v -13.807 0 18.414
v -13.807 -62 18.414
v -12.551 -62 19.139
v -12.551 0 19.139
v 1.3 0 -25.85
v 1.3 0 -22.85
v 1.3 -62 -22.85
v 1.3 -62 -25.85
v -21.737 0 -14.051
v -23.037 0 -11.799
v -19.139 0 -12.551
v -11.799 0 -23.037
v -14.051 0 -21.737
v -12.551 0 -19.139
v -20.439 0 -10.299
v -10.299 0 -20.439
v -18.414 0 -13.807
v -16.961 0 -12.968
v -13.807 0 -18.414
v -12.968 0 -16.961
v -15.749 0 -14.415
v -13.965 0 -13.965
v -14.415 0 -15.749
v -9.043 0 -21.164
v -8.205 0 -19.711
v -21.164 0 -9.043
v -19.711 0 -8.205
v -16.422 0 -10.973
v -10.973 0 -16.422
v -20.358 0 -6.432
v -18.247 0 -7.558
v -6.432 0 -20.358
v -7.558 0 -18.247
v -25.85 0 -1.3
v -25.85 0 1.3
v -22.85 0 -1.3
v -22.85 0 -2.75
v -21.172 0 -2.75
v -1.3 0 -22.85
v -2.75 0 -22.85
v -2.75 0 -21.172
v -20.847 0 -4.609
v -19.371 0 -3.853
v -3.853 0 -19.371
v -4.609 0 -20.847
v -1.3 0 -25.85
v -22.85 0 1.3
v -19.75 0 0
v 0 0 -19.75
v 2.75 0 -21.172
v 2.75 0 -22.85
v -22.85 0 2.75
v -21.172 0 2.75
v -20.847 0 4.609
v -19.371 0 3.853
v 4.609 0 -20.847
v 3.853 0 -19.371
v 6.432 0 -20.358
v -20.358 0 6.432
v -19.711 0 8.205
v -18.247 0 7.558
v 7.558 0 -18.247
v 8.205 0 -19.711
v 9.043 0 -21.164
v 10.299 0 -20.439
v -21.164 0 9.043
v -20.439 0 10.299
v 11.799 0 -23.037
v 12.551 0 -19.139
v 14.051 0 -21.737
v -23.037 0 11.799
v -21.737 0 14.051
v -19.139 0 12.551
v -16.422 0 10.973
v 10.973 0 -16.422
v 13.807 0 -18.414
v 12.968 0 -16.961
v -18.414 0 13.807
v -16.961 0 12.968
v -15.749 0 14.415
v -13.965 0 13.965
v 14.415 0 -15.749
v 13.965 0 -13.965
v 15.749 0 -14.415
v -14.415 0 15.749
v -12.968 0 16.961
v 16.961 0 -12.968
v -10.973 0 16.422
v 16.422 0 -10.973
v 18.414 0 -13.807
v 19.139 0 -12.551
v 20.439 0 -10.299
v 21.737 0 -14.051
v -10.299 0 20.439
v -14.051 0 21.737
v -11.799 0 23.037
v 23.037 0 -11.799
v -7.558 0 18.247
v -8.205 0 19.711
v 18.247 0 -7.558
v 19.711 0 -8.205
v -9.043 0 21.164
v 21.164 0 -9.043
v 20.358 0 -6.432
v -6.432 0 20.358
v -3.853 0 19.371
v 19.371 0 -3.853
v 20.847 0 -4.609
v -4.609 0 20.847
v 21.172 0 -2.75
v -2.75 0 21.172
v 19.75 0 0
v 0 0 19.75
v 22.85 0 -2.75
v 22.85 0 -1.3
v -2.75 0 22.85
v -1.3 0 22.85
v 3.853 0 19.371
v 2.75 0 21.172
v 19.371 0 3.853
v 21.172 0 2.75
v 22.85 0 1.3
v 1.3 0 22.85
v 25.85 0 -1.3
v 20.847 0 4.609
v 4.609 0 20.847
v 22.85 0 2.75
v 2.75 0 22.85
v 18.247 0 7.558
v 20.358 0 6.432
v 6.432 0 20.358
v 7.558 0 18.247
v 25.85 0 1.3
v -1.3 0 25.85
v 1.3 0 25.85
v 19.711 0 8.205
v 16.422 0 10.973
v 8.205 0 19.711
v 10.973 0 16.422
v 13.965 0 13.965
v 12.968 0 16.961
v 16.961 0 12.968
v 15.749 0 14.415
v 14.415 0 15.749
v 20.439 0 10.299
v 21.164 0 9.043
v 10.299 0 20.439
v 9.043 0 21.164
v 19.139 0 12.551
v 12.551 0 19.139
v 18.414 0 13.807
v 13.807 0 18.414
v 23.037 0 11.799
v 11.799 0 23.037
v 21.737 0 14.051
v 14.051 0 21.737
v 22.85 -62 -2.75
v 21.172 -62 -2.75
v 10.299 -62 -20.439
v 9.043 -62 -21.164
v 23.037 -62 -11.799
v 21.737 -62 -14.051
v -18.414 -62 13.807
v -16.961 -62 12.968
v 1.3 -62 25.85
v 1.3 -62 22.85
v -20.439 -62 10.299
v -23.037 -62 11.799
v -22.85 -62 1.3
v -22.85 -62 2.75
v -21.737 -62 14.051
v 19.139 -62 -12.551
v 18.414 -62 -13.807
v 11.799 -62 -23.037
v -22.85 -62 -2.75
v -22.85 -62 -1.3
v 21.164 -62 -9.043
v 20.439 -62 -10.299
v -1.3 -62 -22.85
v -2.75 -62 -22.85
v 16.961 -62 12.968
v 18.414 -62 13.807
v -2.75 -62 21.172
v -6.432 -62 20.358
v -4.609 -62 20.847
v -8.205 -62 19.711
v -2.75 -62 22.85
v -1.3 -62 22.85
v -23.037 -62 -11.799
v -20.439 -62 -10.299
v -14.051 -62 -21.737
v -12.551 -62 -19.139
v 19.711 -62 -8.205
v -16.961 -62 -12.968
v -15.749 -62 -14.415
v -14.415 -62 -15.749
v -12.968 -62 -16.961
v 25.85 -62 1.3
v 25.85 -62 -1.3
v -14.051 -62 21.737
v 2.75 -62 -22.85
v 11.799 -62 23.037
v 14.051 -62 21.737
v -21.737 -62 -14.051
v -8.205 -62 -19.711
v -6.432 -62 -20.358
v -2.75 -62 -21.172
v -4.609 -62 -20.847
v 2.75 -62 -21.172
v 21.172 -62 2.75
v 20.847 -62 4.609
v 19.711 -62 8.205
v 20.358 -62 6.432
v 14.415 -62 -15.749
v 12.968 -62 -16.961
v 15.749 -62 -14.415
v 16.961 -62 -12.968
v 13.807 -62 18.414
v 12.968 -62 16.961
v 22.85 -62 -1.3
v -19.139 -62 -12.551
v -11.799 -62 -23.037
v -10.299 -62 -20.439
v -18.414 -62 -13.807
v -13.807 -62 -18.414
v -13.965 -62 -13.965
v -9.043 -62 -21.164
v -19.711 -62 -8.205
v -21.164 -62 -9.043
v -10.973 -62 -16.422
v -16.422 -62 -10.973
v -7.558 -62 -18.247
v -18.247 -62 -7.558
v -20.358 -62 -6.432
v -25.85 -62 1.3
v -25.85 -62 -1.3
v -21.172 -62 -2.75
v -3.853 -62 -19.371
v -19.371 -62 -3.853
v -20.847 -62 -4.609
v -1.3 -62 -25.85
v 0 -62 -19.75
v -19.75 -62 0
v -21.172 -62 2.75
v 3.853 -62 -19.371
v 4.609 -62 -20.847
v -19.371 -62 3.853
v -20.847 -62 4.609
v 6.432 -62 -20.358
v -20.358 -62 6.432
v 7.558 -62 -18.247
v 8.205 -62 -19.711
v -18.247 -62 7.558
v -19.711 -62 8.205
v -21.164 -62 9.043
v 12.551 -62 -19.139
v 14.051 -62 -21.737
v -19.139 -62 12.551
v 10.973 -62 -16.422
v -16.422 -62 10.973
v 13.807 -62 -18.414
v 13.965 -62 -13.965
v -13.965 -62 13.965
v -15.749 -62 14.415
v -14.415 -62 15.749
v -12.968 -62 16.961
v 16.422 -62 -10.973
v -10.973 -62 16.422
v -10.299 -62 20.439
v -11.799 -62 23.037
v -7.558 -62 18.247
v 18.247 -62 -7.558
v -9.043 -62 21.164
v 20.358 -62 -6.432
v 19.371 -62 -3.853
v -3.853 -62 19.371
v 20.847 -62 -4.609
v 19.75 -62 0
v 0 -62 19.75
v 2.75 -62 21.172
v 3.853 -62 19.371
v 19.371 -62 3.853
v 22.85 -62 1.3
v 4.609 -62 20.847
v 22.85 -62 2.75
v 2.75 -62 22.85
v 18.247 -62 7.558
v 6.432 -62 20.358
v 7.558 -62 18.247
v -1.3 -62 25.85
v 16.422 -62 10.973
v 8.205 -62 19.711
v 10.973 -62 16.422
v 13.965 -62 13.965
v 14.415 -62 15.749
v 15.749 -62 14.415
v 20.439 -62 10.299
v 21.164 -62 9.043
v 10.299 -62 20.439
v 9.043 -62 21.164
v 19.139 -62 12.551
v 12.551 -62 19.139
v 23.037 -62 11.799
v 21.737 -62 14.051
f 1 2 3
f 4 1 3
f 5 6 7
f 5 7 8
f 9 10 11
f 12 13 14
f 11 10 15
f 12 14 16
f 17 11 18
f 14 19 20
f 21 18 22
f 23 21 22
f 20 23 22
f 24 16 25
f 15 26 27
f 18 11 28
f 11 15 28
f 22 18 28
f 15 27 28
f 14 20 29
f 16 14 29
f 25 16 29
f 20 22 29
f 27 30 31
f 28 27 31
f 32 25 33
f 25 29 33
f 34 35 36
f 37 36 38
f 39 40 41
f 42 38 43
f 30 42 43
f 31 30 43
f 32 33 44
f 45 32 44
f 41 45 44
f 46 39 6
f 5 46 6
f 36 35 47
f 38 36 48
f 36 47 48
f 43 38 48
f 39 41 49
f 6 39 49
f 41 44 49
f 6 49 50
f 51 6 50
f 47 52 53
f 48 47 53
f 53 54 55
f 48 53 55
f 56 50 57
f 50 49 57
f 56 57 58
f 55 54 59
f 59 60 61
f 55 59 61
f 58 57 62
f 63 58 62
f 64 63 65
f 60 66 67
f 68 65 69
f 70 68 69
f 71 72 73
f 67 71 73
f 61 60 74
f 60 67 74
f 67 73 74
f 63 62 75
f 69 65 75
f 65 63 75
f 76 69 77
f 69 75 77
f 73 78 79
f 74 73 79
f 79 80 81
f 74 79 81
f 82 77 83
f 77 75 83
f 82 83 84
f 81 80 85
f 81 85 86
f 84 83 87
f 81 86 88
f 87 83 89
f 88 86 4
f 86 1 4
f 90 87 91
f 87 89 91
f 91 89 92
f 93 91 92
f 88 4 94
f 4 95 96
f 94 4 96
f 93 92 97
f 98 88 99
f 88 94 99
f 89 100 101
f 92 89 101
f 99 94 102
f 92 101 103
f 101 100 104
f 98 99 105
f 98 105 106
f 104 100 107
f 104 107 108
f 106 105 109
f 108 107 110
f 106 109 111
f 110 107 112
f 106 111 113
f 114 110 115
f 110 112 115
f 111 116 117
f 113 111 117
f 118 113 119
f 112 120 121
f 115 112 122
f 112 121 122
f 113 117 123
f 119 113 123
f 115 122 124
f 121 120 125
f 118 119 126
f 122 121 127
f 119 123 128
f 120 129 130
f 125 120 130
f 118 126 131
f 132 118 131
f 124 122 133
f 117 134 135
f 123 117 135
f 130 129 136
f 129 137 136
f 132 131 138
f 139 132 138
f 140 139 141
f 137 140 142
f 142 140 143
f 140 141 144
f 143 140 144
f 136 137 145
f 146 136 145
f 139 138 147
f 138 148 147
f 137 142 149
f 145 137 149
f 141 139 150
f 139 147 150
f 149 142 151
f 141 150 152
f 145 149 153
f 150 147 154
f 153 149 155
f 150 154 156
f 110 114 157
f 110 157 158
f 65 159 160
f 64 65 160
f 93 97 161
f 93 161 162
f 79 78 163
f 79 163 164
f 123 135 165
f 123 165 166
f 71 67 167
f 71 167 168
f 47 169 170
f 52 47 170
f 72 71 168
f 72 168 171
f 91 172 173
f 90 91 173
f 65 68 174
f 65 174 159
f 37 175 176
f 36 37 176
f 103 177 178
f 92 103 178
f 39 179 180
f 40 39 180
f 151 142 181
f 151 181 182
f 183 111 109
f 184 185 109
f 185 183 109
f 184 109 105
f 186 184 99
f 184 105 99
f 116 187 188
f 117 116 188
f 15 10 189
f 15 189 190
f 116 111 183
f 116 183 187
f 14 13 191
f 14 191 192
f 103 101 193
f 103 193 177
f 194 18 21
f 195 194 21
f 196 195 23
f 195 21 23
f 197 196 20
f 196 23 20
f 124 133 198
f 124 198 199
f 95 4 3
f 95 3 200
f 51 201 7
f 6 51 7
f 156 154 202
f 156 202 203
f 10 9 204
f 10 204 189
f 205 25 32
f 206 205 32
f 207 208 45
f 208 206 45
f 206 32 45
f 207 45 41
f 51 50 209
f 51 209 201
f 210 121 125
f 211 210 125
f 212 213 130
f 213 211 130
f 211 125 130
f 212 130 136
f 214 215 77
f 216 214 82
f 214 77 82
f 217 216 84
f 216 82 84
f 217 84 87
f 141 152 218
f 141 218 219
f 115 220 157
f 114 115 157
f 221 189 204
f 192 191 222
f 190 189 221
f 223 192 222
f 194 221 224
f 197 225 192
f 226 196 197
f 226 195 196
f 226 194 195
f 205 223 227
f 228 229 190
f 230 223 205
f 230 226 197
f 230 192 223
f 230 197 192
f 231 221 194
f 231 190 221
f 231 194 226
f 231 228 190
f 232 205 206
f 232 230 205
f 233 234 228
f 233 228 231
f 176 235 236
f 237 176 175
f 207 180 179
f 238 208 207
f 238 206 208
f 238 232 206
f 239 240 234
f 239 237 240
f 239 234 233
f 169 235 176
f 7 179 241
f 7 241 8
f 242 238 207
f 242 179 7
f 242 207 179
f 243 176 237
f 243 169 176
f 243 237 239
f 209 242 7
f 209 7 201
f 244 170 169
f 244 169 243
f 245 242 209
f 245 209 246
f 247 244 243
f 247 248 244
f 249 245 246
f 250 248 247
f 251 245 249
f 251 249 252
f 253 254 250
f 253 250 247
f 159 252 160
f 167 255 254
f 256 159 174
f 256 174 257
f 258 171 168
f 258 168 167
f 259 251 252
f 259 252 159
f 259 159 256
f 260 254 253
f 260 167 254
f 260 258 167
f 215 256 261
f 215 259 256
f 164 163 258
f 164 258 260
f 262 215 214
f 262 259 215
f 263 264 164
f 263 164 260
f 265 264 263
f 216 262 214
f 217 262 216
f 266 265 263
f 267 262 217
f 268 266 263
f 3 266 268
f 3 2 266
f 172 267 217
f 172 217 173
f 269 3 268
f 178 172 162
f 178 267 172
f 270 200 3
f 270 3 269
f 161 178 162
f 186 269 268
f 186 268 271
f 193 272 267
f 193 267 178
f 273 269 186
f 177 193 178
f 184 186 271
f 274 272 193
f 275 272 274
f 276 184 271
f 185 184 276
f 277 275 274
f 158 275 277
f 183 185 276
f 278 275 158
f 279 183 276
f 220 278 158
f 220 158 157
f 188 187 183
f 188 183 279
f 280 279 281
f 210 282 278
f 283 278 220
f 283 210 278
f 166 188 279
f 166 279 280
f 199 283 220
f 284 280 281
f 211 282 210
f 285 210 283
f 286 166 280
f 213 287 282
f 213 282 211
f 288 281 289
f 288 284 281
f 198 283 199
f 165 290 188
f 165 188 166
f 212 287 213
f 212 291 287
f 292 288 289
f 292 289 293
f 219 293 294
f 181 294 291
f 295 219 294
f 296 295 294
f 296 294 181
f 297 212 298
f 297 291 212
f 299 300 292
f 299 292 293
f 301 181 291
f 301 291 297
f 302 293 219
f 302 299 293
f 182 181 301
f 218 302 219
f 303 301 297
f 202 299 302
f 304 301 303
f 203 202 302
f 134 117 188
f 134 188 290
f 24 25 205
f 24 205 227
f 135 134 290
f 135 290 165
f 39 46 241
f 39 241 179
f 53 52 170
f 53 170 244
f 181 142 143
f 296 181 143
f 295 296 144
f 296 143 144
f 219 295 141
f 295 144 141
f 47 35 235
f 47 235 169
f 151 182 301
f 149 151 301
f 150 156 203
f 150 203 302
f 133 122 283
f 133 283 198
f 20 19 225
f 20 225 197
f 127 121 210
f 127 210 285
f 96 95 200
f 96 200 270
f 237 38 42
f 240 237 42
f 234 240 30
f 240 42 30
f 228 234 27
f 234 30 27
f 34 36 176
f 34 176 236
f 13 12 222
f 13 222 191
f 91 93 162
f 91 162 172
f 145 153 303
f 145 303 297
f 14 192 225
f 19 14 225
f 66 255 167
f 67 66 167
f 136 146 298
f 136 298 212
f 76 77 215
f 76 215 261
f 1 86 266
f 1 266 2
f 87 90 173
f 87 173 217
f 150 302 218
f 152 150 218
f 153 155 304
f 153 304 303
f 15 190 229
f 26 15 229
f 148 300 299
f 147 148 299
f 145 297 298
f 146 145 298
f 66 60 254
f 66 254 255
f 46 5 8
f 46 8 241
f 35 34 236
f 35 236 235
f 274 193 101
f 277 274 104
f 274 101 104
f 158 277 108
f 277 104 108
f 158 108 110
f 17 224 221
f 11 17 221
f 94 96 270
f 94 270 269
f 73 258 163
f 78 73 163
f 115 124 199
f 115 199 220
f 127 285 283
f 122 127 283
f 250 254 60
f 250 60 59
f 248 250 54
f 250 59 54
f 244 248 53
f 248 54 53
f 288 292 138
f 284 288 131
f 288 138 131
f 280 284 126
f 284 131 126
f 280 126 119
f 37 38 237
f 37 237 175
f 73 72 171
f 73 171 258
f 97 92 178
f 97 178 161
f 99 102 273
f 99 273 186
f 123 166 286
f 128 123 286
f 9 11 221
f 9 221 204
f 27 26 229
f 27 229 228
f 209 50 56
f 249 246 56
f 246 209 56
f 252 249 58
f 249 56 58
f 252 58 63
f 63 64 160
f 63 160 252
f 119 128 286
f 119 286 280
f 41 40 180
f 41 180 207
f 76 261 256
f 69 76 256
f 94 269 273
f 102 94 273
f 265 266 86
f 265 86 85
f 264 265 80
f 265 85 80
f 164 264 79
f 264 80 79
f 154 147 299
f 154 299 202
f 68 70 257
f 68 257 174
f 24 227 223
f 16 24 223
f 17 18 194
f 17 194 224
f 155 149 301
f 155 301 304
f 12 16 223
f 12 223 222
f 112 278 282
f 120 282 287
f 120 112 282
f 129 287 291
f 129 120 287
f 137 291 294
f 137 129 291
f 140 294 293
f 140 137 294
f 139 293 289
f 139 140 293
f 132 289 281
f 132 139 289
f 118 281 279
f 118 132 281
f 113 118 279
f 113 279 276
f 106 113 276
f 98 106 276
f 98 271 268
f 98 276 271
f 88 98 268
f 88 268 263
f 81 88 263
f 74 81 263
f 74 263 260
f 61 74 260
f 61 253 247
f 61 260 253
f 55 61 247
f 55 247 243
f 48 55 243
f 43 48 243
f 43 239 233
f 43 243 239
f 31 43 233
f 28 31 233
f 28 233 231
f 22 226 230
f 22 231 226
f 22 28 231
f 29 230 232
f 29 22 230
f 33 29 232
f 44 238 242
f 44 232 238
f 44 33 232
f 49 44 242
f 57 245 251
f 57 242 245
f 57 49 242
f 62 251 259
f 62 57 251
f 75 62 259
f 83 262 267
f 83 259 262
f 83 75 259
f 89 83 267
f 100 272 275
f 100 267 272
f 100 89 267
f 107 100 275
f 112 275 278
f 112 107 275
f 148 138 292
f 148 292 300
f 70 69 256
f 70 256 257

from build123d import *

# Parameters (mm, degrees)
F0_R     = 21.35
F0_R_2   = 19.75
F1_DEPTH = 62
F3_DEPTH = 62
F4_COUNT = 12


with BuildPart() as f1:
    # F0 (on Front) → F1 (new body)
    with BuildSketch(Plane.XZ):
        Circle(F0_R)
        Circle(F0_R_2, mode=Mode.SUBTRACT)
    extrude(amount=F1_DEPTH)

    # F2 (on face) → F3 (join)
    with BuildSketch(Plane(origin=(0, 0, 0), x_dir=(-1, 0, 0), z_dir=(0, 1, 0))):
        with BuildLine():
            Line((-2.75, 22.85), (-2.75, 21.1721515203))
            ThreePointArc((-2.75, 21.1721515203), (0, 21.35), (2.75, 21.1721515203))
            Line((2.75, 21.1721515203), (2.75, 22.85))
            Line((2.75, 22.85), (1.3, 22.85))
            Line((1.3, 22.85), (1.3, 25.85))
            Line((1.3, 25.85), (-1.3, 25.85))
            Line((-1.3, 25.85), (-1.3, 22.85))
            Line((-1.3, 22.85), (-2.75, 22.85))
        make_face()
    extrude(amount=-F3_DEPTH)

    # F4: F1 ×12 about axis
    f4_axis = Axis((0, 0, 0), (0, 1, 0))


with BuildPart() as f1_1:
    add(f1.part)
    for i in range(1, F4_COUNT):
        add(f1.part.rotate(f4_axis, i * 360 / F4_COUNT))


solid = f1_1.part
